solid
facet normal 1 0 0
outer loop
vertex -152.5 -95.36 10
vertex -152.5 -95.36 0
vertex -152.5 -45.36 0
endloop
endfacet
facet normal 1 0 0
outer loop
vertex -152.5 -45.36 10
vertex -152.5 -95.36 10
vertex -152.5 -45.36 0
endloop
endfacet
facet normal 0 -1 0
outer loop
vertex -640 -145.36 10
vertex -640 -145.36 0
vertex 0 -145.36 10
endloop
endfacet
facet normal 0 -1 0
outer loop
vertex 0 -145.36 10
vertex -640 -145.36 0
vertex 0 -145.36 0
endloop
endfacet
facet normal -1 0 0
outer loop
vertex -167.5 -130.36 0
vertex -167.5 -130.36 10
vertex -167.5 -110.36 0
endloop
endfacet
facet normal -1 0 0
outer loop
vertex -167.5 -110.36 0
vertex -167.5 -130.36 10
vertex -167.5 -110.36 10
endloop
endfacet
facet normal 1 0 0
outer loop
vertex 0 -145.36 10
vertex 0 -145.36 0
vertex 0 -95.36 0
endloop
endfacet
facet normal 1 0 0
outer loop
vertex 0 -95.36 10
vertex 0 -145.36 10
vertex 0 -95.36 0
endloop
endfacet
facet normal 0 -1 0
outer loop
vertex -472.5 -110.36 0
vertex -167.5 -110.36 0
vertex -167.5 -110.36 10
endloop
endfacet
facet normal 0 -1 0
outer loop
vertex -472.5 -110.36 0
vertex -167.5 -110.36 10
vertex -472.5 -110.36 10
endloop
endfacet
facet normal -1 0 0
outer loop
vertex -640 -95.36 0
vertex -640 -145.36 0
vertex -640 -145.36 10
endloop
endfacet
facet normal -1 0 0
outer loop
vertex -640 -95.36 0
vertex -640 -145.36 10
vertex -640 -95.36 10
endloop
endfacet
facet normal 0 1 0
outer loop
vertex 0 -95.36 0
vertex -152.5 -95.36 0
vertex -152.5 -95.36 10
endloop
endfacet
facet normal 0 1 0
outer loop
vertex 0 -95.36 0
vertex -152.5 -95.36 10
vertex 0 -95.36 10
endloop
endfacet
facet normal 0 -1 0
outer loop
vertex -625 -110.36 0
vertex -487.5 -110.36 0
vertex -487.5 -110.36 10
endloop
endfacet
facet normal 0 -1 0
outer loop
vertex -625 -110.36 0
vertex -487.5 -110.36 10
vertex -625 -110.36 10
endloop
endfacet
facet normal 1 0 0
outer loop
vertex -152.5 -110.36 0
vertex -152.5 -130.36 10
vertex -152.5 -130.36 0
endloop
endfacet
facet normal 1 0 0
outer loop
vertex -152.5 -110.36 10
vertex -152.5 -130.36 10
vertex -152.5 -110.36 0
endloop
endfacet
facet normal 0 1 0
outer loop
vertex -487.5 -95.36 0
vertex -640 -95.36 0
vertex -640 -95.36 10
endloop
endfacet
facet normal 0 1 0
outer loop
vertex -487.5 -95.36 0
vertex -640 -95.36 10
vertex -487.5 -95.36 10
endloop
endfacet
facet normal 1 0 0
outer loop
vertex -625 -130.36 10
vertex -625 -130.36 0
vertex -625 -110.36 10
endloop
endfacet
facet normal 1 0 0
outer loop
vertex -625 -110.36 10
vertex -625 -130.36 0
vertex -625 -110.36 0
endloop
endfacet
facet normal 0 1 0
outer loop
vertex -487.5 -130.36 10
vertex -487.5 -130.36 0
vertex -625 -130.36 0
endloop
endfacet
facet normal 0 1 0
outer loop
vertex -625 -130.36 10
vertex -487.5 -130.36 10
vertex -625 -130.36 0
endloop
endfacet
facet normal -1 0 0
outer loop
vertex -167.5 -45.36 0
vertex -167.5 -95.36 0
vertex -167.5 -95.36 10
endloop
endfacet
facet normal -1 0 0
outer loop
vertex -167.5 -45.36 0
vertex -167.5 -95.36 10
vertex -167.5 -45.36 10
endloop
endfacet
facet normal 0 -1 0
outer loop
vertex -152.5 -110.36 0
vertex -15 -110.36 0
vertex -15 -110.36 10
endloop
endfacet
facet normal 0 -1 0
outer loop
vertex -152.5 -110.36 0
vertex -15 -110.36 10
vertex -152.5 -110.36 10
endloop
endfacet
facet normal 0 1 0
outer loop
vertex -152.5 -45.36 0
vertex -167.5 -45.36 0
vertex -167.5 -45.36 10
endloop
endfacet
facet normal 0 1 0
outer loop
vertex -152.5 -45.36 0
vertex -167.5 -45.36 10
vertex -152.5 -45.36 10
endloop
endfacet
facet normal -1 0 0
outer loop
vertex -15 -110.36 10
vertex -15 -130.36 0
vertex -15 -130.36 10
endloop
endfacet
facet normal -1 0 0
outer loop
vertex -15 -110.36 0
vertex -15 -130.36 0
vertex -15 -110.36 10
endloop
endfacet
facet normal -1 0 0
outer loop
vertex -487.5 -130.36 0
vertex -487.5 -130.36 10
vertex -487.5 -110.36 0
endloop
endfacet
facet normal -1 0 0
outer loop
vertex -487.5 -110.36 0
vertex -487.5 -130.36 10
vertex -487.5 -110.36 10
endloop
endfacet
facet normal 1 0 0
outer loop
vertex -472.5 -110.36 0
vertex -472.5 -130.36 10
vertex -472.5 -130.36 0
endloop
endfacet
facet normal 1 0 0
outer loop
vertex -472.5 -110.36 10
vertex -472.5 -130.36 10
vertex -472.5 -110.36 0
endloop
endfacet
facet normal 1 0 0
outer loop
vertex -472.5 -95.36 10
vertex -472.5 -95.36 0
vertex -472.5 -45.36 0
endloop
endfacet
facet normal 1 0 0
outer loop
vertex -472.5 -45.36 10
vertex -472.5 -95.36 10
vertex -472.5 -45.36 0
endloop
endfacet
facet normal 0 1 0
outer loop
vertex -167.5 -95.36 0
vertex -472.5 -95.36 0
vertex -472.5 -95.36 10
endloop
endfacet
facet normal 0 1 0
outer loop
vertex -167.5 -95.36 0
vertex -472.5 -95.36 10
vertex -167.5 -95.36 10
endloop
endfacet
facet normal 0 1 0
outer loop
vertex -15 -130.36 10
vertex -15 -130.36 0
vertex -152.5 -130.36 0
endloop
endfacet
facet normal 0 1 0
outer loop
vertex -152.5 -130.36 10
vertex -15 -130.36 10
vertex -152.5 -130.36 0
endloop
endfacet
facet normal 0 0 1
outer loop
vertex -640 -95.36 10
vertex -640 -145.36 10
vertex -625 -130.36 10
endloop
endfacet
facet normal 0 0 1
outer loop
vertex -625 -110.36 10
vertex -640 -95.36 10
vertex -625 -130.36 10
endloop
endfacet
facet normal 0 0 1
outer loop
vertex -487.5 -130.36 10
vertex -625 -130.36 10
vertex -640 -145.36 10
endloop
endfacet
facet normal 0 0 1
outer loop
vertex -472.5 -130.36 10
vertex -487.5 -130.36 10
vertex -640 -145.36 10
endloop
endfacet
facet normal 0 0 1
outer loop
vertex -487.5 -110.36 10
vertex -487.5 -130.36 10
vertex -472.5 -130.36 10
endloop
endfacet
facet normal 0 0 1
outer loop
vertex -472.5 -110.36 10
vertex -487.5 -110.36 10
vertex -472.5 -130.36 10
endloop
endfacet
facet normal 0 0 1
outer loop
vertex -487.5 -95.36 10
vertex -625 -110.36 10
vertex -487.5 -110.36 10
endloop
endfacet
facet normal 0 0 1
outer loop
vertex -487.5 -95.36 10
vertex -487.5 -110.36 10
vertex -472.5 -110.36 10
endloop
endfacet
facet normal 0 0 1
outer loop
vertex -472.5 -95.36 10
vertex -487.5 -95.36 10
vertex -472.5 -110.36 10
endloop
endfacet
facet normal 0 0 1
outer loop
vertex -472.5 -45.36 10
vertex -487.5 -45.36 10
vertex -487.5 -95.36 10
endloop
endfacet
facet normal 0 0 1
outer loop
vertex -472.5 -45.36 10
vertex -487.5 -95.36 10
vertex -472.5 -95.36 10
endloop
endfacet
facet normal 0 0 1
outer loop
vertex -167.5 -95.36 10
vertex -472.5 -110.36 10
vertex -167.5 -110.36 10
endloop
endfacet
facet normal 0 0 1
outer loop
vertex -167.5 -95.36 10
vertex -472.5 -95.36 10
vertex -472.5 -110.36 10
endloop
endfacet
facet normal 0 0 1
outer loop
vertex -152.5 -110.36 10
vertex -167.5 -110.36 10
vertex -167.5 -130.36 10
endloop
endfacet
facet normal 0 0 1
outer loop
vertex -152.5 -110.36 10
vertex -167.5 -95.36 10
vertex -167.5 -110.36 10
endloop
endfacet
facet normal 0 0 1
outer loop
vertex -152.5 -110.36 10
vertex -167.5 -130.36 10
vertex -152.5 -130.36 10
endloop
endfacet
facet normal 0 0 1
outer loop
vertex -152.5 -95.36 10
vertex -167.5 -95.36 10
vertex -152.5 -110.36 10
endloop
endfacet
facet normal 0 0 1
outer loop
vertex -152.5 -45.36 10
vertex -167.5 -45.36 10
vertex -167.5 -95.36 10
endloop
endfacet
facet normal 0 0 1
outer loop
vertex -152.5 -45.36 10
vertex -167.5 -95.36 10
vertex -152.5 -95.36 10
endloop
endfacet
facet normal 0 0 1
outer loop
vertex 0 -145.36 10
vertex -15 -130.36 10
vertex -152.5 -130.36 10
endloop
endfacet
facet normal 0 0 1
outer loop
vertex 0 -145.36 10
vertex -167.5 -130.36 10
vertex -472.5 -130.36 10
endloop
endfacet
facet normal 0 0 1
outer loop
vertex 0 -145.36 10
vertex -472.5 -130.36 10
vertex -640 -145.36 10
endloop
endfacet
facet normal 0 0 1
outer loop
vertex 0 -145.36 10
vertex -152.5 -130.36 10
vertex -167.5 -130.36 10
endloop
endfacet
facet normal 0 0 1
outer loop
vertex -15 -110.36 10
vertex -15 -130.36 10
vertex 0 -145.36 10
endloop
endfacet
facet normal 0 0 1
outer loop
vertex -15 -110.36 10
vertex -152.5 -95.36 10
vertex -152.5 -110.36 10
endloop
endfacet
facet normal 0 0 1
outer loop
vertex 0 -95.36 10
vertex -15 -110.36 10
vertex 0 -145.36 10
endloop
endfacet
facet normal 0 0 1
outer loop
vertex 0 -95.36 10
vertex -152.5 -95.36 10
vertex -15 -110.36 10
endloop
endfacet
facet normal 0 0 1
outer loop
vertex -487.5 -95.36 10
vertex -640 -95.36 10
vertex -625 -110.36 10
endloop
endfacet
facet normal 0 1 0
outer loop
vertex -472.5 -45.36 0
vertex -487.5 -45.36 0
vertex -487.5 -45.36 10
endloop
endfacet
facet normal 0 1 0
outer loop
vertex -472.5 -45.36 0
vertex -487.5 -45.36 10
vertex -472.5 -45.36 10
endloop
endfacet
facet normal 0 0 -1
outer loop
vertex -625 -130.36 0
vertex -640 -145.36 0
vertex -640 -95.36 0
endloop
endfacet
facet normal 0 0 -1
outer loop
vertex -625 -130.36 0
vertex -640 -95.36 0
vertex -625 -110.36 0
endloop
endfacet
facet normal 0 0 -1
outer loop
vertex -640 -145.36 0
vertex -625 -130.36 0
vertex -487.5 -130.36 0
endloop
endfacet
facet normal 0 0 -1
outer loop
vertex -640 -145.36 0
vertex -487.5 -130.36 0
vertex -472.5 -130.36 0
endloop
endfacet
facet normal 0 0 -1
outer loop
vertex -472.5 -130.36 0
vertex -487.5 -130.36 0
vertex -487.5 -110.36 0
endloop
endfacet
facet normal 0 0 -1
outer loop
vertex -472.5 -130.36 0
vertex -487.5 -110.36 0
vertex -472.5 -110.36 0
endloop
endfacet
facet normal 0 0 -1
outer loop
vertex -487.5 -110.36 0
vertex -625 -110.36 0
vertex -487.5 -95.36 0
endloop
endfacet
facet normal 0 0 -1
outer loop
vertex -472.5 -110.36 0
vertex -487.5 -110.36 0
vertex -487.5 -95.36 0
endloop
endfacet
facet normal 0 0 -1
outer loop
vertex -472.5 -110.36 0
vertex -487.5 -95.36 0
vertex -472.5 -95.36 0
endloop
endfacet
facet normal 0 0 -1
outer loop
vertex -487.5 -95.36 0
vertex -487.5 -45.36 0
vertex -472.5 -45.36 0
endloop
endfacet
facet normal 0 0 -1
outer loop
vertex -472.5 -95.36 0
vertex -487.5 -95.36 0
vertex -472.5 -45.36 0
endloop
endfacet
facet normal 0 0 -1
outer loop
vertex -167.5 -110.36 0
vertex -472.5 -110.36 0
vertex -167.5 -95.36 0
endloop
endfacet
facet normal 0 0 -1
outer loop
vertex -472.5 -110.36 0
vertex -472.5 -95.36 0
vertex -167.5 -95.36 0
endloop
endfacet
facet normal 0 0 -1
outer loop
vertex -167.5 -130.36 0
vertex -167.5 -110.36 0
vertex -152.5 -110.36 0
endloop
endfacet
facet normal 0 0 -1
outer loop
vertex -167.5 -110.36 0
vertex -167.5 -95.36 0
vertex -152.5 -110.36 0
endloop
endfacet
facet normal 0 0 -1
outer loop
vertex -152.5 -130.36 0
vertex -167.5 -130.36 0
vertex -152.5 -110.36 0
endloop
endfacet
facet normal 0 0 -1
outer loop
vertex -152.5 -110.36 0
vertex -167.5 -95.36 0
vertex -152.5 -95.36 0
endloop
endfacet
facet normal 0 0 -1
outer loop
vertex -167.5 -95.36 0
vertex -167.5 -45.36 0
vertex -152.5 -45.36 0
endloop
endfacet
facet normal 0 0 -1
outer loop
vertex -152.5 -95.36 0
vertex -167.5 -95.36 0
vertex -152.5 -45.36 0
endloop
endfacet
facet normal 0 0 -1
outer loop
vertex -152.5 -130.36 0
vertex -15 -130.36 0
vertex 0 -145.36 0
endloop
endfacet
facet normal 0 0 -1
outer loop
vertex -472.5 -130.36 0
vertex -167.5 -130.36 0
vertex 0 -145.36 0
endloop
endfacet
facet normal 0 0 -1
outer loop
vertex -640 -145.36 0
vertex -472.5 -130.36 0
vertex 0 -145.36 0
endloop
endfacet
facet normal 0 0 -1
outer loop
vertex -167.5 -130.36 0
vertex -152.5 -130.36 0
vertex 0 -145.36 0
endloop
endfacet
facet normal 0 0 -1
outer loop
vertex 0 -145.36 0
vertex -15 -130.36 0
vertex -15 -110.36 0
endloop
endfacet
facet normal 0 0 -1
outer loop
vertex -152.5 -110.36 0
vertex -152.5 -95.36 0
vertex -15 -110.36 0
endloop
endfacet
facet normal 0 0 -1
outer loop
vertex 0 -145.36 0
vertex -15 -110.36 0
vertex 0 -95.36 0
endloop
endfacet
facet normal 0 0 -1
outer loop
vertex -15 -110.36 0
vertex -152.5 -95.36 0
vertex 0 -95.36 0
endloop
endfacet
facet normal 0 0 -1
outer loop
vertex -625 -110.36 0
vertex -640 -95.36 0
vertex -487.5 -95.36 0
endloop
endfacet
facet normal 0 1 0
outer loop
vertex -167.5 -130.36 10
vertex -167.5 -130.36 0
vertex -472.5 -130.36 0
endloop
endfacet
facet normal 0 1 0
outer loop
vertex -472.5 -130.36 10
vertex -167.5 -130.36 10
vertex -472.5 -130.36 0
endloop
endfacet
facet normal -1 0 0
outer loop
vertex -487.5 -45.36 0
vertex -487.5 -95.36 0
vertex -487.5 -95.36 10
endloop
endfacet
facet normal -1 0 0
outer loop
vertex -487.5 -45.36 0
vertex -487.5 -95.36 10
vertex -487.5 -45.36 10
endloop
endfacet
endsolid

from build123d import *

# Parameters (mm, degrees)
SKETCH1_W                = 640
SKETCH1_H                = 50
BOSS_EXTRUDE1_DEPTH      = 10
SKETCH2_W                = 15
SKETCH2_H                = 50
BOSS_EXTRUDE2_DEPTH      = 10
SKETCH3_W                = 610
SKETCH3_H                = 20
CUT_EXTRUDE1_DEPTH       = 10
ESBO_O1_W                = 15
ESBO_O1_H                = 20
RESSALTO_EXTRUS_O1_DEPTH = 10


with BuildPart() as part:
    # Sketch1 → Boss-Extrude1 (new body)
    with BuildSketch(Plane.XY):
        with Locations((-320, -120.36)):
            Rectangle(SKETCH1_W, SKETCH1_H)
    extrude(amount=BOSS_EXTRUDE1_DEPTH)

    # Sketch2 → Boss-Extrude2 (add)
    with BuildSketch(Plane.XY):
        with Locations((-160, -70.36)):
            Rectangle(SKETCH2_W, SKETCH2_H)
        with Locations((-480, -70.36)):
            Rectangle(SKETCH2_W, SKETCH2_H)
    extrude(amount=BOSS_EXTRUDE2_DEPTH)

    # Sketch3 → Cut-Extrude1 (cut)
    with BuildSketch(Plane(origin=(0, 0, 0), x_dir=(-1, 0, 0), z_dir=(0, 0, -1))):
        with Locations((320, -120.36)):
            Rectangle(SKETCH3_W, SKETCH3_H)
    extrude(amount=-CUT_EXTRUDE1_DEPTH, mode=Mode.SUBTRACT)

    # Esboço1 → Ressalto-extrusão1 (add)
    with BuildSketch(Plane.XY.offset(10)):
        with Locations((-480, -120.36)):
            Rectangle(ESBO_O1_W, ESBO_O1_H)
        with Locations((-160, -120.36)):
            Rectangle(ESBO_O1_W, ESBO_O1_H)
    extrude(amount=-RESSALTO_EXTRUS_O1_DEPTH)


solid = part.part
